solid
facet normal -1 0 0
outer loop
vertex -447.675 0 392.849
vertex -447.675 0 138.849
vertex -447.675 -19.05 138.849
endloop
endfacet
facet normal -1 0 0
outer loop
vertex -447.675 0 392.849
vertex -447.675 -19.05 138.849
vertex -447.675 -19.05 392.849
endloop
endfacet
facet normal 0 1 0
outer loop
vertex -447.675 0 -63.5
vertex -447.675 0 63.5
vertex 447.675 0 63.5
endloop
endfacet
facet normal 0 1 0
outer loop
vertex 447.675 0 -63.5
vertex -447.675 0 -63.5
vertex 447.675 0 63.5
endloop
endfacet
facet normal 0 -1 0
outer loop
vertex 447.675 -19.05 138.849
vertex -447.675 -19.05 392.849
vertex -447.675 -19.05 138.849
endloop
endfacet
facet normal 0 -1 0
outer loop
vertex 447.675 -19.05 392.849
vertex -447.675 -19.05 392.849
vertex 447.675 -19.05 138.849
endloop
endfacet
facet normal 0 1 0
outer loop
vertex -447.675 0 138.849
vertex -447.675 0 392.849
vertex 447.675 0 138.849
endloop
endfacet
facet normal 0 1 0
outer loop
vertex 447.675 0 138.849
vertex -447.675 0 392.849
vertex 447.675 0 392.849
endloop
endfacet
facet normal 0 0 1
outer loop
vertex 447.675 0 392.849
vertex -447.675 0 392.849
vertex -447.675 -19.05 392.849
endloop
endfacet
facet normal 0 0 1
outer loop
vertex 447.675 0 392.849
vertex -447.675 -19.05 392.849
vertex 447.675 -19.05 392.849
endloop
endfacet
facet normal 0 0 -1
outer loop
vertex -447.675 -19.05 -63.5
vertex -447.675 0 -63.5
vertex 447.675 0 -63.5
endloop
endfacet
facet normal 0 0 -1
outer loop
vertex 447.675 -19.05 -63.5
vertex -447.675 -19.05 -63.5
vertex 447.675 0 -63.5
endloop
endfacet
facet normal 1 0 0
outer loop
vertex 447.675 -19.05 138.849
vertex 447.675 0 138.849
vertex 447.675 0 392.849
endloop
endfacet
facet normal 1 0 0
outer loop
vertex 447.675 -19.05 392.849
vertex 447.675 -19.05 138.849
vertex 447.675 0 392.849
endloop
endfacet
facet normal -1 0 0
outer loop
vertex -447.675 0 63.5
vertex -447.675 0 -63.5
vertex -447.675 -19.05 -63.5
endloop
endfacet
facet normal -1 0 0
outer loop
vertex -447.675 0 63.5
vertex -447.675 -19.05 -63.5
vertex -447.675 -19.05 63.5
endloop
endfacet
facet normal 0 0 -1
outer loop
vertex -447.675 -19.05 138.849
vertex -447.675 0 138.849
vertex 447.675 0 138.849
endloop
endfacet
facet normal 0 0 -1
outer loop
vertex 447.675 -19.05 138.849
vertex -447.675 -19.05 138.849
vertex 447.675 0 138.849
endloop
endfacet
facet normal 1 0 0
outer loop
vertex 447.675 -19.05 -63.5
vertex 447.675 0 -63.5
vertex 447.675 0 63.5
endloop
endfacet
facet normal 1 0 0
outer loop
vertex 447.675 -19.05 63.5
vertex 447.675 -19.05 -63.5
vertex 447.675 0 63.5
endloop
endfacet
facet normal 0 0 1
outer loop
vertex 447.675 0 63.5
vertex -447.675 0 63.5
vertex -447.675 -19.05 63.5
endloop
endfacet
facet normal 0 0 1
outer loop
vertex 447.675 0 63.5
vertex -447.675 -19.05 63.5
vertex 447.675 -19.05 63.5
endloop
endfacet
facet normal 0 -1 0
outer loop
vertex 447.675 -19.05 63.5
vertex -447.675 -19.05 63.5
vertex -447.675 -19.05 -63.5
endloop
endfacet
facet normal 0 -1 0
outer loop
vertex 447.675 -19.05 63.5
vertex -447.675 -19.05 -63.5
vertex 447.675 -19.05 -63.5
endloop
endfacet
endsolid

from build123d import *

# Parameters (mm, degrees)
F0_W     = 895.35
F0_H     = 254
F0_H_2   = 127
F1_DEPTH = 19.05


with BuildPart() as f1:
    # F0 (on Front) → F1 (new body)
    with BuildSketch(Plane.XZ):
        with Locations((0, 265.849303)):
            Rectangle(F0_W, F0_H)
        Rectangle(F0_W, F0_H_2)
    extrude(amount=F1_DEPTH)


solid = f1.part
